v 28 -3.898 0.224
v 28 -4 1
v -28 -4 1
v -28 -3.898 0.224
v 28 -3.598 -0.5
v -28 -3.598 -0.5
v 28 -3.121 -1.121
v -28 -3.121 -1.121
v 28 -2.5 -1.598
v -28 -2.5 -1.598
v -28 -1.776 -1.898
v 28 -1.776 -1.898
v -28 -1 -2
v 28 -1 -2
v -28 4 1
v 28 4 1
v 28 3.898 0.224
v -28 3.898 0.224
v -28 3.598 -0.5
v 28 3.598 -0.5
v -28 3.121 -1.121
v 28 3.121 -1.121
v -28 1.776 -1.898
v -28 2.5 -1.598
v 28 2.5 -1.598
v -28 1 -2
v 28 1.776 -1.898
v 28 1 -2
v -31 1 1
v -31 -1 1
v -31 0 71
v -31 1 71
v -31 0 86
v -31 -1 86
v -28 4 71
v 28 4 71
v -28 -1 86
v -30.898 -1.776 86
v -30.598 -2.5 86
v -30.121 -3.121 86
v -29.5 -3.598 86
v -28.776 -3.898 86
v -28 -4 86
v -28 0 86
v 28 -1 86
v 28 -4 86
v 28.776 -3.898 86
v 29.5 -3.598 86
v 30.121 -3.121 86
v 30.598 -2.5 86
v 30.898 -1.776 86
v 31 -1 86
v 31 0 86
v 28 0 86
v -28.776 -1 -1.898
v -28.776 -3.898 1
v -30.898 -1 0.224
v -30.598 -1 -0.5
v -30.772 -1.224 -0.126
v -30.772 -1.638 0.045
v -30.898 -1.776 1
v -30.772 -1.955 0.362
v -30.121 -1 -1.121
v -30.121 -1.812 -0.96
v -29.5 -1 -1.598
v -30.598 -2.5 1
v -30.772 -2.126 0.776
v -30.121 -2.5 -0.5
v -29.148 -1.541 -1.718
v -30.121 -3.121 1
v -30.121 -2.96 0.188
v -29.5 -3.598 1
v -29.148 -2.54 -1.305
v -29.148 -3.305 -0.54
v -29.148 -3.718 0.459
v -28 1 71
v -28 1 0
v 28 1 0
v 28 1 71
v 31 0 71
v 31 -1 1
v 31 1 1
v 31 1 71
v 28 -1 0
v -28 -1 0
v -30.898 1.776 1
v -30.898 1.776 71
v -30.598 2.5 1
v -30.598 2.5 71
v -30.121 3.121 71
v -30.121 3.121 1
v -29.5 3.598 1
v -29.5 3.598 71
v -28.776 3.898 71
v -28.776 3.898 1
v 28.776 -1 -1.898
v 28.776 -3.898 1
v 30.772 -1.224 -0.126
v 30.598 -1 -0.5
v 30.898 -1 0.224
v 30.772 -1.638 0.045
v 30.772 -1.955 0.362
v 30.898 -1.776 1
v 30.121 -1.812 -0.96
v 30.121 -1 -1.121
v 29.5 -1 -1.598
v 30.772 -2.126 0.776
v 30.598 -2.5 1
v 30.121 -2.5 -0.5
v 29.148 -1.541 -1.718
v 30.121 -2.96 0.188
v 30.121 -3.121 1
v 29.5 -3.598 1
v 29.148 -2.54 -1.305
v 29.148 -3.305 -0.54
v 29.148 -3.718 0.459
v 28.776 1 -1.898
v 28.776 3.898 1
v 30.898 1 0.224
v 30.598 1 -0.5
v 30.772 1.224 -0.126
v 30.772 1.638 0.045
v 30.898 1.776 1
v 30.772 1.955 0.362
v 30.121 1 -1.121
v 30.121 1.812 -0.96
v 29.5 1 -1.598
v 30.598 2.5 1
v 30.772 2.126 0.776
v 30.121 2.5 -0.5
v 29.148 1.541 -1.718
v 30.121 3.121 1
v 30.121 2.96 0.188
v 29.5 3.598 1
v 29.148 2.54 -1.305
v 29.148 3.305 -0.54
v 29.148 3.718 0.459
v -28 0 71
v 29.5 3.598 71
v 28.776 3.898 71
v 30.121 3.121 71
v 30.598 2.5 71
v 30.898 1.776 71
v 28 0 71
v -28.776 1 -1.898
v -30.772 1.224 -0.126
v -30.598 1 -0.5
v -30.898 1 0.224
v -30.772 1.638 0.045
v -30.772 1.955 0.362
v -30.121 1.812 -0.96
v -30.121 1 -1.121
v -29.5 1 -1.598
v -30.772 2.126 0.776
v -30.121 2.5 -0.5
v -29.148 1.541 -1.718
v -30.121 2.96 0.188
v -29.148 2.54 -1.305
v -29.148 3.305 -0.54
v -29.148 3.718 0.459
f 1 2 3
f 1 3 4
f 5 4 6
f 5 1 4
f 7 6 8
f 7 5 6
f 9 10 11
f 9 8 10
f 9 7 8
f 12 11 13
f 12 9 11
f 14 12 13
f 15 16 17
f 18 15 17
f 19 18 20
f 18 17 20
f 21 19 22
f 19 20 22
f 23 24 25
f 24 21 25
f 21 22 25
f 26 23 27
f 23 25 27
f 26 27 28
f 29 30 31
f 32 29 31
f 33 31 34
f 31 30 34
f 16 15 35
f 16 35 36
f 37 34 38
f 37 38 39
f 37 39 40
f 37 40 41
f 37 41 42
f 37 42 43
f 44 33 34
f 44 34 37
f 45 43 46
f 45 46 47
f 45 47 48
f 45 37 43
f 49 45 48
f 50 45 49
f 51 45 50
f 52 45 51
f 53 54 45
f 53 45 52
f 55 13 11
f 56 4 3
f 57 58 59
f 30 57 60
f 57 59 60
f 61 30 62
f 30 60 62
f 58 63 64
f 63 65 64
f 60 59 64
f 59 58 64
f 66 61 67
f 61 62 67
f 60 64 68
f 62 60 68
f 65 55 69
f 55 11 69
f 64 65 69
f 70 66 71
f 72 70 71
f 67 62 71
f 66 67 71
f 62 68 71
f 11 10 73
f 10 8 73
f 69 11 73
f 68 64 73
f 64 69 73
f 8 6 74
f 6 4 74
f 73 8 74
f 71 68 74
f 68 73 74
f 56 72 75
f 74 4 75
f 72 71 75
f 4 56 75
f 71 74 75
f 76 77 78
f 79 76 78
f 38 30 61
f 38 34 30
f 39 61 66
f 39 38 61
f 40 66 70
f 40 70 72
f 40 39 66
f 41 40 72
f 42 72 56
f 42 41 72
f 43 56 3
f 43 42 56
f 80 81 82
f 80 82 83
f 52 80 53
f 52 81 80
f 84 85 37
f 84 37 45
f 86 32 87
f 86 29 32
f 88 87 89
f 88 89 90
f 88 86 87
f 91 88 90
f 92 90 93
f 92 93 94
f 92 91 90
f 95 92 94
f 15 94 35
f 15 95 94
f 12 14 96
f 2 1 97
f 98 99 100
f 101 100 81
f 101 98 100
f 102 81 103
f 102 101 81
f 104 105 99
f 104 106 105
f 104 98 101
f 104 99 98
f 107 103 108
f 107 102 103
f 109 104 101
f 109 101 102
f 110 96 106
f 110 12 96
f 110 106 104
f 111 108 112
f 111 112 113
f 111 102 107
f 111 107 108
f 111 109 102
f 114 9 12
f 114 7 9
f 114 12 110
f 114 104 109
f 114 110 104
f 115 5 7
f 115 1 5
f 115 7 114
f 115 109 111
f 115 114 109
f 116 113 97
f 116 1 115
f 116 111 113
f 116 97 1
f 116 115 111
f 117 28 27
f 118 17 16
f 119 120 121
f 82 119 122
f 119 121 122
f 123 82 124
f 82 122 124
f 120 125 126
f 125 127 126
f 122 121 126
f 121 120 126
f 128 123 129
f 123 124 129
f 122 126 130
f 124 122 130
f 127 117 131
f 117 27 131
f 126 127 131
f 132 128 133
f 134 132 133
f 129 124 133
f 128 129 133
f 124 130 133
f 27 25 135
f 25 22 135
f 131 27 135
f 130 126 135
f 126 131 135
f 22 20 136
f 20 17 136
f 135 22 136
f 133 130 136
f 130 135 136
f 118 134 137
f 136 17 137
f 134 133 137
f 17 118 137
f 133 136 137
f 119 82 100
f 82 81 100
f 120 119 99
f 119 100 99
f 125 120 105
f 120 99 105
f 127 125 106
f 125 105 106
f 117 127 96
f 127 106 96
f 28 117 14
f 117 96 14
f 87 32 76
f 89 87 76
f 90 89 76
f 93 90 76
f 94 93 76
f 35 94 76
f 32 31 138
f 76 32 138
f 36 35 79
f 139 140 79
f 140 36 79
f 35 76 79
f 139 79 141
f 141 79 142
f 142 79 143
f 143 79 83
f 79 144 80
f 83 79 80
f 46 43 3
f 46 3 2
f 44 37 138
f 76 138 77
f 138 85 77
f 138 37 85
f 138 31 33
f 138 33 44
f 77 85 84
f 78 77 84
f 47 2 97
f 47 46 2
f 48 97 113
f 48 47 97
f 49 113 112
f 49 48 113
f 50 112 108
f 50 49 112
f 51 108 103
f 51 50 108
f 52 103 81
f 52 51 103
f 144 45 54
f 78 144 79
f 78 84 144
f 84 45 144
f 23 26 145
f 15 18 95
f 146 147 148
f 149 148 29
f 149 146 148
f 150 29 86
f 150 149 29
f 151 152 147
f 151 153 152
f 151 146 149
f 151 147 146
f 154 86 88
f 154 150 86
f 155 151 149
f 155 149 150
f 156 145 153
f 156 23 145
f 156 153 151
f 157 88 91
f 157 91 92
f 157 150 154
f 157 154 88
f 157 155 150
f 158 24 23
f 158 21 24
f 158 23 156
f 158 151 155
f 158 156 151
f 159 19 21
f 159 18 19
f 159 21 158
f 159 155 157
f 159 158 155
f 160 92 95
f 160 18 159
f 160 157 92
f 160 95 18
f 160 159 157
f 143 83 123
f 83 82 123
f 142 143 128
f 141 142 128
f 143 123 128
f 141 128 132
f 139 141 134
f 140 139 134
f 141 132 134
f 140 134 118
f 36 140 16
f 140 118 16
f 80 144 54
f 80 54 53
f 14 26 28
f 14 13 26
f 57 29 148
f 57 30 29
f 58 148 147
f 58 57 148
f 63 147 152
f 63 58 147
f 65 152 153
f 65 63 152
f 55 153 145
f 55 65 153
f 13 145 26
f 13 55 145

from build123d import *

# Parameters (mm, degrees)
F0_W     = 62
F0_H     = 8
F0_W_2   = 56
F0_H_2   = 2
F1_DEPTH = 86
F2_W     = 62
F2_H     = 15
F3_DEPTH = 5
F4_W     = 62
F4_H     = 2
F5_DEPTH = 4
F6_R     = 3


with BuildPart() as f1:
    # F0 (on Top) → F1 (new body)
    with BuildSketch(Plane.XY):
        Rectangle(F0_W, F0_H)
        Rectangle(F0_W_2, F0_H_2, mode=Mode.SUBTRACT)
    extrude(amount=F1_DEPTH)

    # F2 (on Front) → F3 (cut)
    with BuildSketch(Plane.XZ):
        with Locations((0, 78.5)):
            Rectangle(F2_W, F2_H)
    extrude(amount=-F3_DEPTH, mode=Mode.SUBTRACT)

    # F4 (on Front) → F5 (join, symmetric)
    with BuildSketch(Plane.XZ):
        with Locations((0, -1)):
            Rectangle(F4_W, F4_H)
    extrude(amount=F5_DEPTH, both=True)

    # F6
    f6_edges = [f1.edges().sort_by_distance(p)[0] for p in [
        (0, 4, -2),
        (0, -4, -2),
        (31, 0, -2),
        (-31, 0, -2),
        (31, 4, 34.5),
        (31, -4, 42),
        (-31, 4, 34.5),
        (-31, -4, 42),
    ]]
    fillet(f6_edges, radius=F6_R)


solid = f1.part
